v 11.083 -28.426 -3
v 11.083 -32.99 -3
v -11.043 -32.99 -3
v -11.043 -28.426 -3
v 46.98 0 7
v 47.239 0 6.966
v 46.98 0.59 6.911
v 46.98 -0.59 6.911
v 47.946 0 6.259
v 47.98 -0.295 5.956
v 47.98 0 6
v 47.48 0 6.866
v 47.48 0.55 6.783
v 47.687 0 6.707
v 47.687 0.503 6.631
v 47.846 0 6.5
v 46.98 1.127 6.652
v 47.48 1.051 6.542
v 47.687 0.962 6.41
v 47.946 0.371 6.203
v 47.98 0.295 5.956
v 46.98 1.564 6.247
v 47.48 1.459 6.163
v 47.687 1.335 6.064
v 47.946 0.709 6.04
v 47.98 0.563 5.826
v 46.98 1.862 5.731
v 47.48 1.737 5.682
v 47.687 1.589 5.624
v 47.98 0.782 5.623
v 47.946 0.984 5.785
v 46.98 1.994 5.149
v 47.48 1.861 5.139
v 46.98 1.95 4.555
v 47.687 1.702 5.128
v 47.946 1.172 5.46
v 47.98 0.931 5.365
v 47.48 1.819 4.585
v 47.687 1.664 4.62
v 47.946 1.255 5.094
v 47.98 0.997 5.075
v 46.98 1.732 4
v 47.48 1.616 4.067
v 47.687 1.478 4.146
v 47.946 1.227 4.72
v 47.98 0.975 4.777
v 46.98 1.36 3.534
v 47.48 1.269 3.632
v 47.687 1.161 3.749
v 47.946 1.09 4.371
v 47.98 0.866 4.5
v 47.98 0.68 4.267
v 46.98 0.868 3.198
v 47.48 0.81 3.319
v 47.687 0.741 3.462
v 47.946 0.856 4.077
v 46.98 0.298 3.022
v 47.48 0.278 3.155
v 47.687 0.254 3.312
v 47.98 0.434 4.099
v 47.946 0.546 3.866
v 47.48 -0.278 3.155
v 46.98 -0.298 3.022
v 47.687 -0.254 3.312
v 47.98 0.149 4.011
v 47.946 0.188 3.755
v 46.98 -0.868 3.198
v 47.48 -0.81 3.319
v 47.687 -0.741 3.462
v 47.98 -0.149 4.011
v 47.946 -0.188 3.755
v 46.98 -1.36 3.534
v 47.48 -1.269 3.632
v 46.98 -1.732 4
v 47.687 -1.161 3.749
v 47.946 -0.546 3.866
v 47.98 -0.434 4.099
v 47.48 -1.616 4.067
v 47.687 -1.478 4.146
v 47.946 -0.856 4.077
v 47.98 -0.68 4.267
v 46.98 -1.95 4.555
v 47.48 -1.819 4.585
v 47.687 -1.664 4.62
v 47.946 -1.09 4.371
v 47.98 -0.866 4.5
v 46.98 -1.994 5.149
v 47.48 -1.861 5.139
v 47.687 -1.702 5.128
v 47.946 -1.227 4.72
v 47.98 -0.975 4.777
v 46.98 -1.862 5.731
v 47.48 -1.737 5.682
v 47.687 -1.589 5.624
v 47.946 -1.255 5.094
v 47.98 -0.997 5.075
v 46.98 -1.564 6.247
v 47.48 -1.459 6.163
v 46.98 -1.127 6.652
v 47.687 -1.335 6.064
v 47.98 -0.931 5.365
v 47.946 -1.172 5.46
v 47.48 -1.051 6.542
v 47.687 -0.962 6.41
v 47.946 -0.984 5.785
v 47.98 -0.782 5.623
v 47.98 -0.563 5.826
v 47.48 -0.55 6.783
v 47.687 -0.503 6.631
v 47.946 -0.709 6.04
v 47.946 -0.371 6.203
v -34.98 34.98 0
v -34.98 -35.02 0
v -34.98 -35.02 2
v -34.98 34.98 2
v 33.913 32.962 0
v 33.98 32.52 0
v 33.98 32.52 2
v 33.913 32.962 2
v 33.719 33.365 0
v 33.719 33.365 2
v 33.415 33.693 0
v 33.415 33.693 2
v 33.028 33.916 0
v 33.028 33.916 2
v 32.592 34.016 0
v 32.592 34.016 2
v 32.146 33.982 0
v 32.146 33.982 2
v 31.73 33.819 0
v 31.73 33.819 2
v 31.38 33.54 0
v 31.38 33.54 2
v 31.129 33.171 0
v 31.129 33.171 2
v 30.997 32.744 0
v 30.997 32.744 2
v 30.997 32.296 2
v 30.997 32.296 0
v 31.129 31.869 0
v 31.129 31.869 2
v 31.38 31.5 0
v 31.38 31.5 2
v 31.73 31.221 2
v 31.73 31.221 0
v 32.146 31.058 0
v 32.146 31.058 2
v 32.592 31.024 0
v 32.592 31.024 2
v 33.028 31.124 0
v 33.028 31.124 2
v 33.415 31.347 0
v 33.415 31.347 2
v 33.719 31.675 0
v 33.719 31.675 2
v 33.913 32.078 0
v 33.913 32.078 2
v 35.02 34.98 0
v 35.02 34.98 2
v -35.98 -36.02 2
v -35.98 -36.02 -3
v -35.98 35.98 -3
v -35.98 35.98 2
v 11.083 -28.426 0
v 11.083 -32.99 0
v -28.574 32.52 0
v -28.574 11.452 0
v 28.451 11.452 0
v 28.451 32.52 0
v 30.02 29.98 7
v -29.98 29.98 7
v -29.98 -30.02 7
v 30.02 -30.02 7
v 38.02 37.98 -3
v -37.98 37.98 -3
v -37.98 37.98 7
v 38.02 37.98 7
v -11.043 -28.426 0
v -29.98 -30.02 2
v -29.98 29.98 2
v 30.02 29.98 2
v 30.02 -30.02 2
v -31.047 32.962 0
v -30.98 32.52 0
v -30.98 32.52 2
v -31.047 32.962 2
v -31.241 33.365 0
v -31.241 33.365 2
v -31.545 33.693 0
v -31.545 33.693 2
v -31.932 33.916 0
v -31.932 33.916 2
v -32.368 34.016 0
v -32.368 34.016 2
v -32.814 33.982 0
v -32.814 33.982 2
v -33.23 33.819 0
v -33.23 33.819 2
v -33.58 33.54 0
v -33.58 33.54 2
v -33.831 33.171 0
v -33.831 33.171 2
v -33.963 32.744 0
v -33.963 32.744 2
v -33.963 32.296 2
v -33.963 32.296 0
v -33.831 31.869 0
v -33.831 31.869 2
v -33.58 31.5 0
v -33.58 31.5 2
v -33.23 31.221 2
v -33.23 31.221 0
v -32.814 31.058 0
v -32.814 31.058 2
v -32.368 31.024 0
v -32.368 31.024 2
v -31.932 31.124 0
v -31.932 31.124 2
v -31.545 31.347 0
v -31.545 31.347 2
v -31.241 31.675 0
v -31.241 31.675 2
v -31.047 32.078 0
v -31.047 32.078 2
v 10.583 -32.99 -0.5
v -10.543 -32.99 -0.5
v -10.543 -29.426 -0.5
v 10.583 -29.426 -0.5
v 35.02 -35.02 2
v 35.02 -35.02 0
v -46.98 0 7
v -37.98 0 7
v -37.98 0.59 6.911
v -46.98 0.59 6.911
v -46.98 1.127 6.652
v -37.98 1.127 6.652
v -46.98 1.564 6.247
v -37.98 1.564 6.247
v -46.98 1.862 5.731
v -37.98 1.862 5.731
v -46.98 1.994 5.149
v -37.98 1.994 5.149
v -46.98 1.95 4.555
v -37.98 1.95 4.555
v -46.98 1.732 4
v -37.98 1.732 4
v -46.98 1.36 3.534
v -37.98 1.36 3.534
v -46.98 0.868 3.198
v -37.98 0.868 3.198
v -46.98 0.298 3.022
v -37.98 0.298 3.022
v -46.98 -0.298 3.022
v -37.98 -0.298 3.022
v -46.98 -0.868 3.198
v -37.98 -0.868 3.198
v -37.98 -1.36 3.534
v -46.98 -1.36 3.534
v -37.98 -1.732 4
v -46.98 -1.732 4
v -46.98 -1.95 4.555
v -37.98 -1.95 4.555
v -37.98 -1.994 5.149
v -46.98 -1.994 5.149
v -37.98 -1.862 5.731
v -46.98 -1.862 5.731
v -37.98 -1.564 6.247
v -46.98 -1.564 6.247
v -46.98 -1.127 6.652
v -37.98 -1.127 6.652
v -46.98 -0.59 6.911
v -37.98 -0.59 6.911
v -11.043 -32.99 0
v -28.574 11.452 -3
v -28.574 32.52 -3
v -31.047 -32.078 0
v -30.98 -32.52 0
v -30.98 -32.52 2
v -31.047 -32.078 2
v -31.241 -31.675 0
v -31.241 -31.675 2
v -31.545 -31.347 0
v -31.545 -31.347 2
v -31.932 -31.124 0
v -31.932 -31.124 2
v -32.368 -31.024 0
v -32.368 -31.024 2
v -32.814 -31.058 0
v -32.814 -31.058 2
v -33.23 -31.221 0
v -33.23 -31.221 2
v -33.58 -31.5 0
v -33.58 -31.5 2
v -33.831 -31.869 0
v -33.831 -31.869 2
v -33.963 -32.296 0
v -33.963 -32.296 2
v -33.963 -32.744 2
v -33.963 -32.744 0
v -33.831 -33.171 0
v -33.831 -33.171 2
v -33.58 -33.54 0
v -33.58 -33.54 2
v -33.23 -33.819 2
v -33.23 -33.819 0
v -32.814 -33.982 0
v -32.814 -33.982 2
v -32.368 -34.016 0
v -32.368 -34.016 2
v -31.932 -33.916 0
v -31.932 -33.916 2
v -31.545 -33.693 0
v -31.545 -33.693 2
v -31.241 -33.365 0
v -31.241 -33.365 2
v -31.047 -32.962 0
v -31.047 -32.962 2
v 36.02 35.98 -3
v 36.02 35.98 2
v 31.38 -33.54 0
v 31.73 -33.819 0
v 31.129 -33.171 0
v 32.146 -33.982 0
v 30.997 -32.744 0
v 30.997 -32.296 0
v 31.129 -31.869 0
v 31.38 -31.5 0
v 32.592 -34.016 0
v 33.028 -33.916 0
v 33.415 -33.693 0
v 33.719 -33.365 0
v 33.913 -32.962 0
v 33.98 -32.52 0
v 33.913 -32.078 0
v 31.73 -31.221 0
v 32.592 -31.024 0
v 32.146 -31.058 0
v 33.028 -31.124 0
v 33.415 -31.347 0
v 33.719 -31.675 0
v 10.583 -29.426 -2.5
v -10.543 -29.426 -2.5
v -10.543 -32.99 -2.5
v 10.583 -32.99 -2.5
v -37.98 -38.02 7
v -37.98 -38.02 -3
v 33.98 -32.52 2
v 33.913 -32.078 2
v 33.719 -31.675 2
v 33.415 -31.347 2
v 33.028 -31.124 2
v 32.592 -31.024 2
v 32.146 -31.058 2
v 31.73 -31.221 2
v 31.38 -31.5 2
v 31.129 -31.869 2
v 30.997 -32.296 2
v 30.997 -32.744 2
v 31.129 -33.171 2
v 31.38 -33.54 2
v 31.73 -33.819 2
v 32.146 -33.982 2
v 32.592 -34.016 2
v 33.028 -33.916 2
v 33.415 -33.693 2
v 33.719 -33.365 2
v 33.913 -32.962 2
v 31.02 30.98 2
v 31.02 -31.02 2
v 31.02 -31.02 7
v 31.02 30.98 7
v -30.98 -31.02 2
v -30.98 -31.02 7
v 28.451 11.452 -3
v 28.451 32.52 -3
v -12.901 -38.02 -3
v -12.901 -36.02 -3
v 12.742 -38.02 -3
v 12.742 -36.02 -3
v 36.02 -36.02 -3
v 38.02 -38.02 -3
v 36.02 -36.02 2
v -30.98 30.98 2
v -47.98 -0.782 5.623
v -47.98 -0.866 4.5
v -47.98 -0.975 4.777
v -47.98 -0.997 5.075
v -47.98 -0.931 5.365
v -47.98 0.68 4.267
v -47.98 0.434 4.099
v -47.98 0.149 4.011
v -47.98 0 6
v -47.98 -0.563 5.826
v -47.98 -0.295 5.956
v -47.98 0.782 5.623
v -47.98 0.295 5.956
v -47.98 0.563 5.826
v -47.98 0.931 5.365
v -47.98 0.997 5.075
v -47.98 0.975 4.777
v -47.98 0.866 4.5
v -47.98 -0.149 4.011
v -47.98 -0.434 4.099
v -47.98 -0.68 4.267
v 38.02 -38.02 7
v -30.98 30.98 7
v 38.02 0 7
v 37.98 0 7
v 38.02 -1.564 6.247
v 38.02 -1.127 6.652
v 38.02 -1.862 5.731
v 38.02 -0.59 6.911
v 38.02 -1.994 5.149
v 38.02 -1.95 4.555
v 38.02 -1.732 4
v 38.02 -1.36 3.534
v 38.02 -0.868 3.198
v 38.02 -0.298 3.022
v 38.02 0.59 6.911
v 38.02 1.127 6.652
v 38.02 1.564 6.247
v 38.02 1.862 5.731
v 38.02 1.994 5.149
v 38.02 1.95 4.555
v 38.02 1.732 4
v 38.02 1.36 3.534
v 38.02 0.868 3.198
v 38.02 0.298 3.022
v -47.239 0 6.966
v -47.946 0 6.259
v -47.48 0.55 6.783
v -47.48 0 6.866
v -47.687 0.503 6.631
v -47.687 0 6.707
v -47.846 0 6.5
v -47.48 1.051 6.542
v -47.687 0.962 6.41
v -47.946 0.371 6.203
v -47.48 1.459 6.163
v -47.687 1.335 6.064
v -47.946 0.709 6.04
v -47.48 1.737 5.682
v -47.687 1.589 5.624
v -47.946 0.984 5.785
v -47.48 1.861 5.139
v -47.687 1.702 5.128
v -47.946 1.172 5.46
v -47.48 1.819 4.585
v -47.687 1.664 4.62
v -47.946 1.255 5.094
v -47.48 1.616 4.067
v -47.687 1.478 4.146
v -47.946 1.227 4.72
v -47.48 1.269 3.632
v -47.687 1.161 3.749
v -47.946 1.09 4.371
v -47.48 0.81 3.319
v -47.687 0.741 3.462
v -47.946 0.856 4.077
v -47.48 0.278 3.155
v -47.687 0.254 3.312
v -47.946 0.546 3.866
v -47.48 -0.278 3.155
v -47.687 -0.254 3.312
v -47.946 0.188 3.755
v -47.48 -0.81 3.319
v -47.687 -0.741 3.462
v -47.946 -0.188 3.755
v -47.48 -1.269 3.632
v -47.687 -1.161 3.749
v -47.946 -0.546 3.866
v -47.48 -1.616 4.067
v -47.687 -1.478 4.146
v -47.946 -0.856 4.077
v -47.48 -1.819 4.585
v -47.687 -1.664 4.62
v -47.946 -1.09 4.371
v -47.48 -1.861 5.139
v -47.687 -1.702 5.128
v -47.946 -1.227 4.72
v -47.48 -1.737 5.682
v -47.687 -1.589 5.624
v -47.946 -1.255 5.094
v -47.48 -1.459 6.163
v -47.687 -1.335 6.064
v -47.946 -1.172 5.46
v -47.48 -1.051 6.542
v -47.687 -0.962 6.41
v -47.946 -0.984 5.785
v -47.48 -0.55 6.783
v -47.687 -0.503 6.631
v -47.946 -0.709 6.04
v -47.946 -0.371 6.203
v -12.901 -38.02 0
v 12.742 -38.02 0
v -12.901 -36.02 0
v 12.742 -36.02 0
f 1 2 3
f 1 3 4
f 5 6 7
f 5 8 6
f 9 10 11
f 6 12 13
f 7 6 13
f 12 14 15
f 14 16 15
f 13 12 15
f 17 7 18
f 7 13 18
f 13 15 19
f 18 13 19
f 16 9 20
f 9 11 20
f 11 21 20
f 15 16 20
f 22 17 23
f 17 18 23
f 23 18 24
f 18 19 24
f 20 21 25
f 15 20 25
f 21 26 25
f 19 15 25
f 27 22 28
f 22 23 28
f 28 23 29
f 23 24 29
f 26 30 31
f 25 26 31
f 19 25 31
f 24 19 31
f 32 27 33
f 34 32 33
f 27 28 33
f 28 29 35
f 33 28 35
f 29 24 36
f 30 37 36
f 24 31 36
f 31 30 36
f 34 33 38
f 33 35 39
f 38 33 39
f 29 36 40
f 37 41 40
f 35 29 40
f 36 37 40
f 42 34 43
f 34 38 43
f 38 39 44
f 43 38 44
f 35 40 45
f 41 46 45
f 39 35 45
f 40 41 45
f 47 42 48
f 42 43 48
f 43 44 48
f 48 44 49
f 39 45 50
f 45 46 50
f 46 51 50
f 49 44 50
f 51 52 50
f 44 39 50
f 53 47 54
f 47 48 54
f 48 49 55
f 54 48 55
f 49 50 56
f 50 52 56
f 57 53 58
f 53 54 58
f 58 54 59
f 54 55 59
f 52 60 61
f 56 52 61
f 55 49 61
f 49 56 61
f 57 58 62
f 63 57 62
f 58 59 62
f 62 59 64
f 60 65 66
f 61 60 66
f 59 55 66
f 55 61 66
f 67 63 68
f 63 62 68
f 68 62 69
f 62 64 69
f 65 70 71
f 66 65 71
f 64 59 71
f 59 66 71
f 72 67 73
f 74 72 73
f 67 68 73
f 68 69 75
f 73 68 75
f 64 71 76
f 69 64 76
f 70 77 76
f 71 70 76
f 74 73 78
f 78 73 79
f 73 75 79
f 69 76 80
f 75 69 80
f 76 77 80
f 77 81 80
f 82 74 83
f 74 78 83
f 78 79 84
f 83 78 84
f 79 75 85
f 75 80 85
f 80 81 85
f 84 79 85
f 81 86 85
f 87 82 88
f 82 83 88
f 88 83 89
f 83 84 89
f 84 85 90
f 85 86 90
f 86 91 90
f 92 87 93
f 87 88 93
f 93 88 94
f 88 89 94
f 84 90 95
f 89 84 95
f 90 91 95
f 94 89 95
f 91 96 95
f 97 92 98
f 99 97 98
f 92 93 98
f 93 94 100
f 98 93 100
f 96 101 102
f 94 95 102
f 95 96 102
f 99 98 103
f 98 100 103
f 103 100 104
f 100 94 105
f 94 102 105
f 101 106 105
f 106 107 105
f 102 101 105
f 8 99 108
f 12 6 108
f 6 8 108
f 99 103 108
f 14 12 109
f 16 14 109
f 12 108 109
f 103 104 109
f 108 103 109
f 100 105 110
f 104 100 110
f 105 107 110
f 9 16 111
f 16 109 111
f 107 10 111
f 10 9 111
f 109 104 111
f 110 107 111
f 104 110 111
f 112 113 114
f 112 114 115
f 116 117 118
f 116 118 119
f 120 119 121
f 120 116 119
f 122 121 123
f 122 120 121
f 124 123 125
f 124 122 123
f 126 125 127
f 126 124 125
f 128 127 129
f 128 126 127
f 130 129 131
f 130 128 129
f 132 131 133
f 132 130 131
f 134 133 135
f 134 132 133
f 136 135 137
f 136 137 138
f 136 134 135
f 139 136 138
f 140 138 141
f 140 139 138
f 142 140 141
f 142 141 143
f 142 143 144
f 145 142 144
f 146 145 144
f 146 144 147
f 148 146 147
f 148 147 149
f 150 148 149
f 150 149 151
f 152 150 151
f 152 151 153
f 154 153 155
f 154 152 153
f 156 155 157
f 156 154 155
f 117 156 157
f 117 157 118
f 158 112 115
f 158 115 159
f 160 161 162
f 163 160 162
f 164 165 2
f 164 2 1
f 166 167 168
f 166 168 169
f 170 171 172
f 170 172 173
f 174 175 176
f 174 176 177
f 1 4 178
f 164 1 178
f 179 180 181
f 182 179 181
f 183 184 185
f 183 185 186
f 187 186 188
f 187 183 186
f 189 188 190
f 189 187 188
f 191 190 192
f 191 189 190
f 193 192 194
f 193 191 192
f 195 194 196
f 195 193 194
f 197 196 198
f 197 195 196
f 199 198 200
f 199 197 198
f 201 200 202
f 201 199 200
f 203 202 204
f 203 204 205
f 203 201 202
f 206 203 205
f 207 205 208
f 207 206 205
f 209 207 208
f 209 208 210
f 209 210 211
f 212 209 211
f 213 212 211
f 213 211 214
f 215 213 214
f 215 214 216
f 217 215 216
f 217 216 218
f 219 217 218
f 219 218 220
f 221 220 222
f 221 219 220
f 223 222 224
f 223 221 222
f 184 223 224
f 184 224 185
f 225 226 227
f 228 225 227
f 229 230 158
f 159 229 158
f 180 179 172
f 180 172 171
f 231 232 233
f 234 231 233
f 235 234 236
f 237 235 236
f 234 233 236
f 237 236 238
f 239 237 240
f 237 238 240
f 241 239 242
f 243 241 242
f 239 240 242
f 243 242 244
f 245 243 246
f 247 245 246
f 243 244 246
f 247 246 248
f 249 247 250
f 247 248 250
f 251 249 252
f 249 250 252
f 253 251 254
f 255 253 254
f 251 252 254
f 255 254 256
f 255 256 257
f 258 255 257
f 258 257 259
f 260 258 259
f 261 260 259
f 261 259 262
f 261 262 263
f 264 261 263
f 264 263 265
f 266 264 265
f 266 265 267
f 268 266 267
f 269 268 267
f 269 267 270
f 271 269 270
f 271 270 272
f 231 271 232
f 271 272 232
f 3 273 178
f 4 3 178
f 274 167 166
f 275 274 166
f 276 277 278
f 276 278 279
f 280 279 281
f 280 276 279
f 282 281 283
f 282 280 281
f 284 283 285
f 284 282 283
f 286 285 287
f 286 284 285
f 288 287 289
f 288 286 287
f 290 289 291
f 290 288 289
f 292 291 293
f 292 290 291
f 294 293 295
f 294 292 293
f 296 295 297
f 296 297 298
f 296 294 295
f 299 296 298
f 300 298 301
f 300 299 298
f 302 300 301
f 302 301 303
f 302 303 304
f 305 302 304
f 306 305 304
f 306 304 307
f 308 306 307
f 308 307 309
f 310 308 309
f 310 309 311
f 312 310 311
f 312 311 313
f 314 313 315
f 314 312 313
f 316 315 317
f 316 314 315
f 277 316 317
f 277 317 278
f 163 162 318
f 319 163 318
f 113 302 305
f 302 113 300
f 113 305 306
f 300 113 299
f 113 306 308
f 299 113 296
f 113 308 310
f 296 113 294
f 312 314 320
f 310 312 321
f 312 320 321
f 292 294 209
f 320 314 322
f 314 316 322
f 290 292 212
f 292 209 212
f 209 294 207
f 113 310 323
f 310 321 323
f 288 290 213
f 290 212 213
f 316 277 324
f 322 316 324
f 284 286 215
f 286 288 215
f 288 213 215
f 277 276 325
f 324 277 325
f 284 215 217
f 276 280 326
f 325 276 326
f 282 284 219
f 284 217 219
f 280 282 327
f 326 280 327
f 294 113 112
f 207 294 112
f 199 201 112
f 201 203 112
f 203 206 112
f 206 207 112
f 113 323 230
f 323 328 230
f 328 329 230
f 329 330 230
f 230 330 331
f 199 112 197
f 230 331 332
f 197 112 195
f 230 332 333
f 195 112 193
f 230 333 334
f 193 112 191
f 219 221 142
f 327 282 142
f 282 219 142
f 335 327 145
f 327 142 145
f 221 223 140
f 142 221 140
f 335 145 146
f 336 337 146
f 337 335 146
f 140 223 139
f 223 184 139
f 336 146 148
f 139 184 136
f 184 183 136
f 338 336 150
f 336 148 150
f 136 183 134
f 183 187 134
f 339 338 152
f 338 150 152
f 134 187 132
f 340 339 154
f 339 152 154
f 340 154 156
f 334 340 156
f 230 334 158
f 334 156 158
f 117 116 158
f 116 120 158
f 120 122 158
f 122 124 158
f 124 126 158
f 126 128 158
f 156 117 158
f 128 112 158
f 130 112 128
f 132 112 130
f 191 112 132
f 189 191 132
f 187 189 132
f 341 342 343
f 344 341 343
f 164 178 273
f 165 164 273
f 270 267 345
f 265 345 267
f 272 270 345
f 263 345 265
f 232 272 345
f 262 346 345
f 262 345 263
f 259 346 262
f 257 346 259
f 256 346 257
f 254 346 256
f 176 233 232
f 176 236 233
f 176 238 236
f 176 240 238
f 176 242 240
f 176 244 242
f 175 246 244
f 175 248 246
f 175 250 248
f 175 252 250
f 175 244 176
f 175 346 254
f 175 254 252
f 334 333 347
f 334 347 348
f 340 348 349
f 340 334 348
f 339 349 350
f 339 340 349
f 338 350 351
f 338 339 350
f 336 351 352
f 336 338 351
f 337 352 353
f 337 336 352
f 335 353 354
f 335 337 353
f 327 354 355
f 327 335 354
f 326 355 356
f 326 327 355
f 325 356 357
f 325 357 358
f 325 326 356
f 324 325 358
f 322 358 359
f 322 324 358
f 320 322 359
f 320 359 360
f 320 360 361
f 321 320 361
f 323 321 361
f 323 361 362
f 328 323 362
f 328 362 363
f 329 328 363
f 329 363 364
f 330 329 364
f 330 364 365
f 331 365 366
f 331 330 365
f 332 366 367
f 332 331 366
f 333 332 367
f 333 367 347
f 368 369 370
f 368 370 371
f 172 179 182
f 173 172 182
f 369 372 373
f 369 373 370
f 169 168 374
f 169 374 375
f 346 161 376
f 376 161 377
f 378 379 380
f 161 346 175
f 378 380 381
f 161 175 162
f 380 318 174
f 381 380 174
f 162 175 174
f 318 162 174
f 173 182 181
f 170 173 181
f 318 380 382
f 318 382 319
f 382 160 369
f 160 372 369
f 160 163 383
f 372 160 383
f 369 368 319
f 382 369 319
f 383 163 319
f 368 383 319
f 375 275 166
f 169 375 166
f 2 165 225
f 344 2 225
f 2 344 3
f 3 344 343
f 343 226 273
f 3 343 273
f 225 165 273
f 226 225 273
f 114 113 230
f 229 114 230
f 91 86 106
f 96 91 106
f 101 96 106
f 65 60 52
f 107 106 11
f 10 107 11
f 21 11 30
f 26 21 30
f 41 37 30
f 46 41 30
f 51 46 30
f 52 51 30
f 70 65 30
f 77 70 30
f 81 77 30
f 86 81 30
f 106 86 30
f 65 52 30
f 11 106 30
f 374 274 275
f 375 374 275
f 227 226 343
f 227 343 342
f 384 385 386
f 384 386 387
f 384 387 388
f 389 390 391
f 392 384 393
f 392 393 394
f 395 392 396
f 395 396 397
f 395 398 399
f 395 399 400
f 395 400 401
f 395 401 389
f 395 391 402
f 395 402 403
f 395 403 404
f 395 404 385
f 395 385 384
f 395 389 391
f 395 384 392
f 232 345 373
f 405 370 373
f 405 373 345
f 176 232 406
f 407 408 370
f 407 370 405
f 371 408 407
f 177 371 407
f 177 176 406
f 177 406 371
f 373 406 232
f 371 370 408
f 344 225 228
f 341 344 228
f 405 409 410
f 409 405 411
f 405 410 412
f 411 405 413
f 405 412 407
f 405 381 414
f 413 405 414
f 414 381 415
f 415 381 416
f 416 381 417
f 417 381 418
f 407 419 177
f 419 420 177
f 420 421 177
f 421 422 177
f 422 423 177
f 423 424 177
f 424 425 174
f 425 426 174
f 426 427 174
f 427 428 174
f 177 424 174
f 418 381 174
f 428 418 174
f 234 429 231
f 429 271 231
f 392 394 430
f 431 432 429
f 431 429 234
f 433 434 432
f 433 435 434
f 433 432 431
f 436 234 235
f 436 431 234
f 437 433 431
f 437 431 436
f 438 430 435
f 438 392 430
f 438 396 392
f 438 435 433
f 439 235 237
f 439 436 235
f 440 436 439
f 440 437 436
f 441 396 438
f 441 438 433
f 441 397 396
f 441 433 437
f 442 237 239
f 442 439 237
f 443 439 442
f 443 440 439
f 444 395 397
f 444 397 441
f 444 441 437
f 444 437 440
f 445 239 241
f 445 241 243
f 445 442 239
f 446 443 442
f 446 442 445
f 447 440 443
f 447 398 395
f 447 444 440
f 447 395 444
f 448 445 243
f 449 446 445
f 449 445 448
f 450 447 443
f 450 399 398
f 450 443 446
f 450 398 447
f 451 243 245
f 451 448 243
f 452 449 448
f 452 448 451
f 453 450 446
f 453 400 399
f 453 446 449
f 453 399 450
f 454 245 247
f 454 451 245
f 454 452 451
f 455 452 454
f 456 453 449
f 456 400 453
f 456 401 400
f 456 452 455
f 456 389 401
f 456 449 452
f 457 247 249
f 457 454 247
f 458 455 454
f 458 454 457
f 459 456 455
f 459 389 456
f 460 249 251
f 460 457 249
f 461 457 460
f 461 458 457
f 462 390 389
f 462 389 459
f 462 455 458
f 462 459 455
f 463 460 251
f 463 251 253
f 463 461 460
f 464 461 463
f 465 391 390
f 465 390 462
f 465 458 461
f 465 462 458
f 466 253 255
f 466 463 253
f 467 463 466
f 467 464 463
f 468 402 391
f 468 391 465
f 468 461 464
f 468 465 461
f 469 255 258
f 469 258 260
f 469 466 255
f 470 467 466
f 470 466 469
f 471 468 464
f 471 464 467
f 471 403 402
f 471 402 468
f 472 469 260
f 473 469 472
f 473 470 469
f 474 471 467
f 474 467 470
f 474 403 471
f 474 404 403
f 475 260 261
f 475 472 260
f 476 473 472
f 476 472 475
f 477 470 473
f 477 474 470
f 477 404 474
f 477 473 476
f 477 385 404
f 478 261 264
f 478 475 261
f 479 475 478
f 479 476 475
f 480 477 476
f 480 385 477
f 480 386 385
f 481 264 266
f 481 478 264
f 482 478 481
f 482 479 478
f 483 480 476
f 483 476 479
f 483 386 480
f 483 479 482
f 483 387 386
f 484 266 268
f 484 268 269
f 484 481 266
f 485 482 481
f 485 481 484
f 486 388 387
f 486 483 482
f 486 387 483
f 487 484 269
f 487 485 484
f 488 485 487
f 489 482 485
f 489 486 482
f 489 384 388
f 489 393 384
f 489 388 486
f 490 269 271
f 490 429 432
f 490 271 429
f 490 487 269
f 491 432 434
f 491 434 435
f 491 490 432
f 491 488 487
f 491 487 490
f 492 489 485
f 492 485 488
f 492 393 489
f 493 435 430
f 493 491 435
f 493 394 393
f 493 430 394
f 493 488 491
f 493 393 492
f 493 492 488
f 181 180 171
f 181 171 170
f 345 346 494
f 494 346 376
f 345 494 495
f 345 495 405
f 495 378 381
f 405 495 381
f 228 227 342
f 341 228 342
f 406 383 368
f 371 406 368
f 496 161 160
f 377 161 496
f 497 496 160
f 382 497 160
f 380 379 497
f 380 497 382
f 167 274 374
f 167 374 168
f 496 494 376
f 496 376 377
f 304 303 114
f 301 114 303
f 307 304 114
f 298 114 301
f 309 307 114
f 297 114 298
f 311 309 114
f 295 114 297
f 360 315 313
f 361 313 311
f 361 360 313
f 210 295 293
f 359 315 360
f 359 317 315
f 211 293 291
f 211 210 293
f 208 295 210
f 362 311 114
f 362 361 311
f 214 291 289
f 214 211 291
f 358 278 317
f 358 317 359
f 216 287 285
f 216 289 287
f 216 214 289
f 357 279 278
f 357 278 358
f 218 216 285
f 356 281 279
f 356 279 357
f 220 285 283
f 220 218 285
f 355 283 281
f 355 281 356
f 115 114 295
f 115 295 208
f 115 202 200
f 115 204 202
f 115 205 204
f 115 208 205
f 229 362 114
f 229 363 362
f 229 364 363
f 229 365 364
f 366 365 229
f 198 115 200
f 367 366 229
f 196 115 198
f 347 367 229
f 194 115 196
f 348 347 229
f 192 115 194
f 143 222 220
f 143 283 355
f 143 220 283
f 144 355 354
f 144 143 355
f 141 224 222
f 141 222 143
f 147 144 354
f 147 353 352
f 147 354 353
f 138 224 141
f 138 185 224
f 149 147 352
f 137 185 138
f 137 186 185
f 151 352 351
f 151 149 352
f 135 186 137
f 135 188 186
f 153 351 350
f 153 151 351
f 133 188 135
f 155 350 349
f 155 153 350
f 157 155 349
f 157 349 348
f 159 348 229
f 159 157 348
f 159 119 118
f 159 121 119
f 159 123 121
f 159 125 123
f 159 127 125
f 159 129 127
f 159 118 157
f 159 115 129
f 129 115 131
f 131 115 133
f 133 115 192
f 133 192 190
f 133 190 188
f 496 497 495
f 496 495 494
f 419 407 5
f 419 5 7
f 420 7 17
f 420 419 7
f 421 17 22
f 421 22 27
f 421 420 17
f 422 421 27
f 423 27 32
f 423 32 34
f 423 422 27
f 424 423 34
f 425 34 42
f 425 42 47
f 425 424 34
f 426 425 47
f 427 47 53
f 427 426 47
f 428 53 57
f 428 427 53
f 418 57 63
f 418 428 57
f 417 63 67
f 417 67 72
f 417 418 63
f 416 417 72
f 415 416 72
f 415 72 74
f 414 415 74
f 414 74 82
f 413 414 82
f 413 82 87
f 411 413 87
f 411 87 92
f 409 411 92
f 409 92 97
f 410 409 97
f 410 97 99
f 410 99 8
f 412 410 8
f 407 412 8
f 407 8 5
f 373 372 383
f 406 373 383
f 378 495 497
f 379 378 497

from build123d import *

# Parameters (mm, degrees)
RFID_READER_OUTLINE_W    = 70
RFID_READER_OUTLINE_H    = 70
RFID_READER_OUTLINE_R    = 1.5
RFID_READER_DEPTH        = 2
RFID_READER_START        = -28.574472263
RFID_READER_2_OUTLINE_W  = 21.067677481
RFID_READER_2_OUTLINE_H  = 3
RFID_READER_2_DEPTH      = 57.02588195
RFID_READER_START_2      = 2
RFID_READER_3_OUTLINE_W  = 60
RFID_READER_3_OUTLINE_H  = 60
RFID_READER_3_DEPTH      = 5
RFID_READER_START_3      = -11.042809432
RFID_READER_4_DEPTH      = 22.125679749
RFID_READER_5_OUTLINE_W  = 5.593739236
RFID_READER_5_OUTLINE_H  = 2
RFID_READER_5_DEPTH      = 0.5
RFID_READER_START_4      = 10.582870317
RFID_READER_6_OUTLINE_W  = 5.593739236
RFID_READER_6_OUTLINE_H  = 2
RFID_READER_6_DEPTH      = 0.5
SKETCH2_W                = 72
SKETCH2_H                = 72
SKETCH2_W_2              = 62
SKETCH2_H_2              = 62
BOSS_EXTRUDE5_DEPTH      = 5
BOSS_EXTRUDE7_START      = -5
SKETCH2_8_W              = 76
SKETCH2_8_H              = 76
SKETCH2_8_W_2            = 72
SKETCH2_8_H_2            = 72
BOSS_EXTRUDE7_DEPTH      = 10
SKETCH4_R                = 2
BOSS_EXTRUDE12_DEPTH     = 10
FILLET1_R                = 1
FILLET1_OF_MIRROR1_R     = 1
CUT_EXTRUDE1_START       = -3
CUT_EXTRUDE1_OUTLINE_W   = 25.642995067
CUT_EXTRUDE1_OUTLINE_H   = 2
CUT_EXTRUDE1_OUTLINE_W_2 = 22.125679749
CUT_EXTRUDE1_OUTLINE_H_2 = 2.030434915
CUT_EXTRUDE1_DEPTH       = 3


# Read off the part's stored shape, not the designer's step: RFID_reader, Cut-Extrude1
with BuildPart() as part:
    # RFID_reader outline → RFID_reader (new body)
    with BuildSketch(Plane.XY):
        with Locations((0.020030443, -0.020030443)):
            Rectangle(RFID_READER_OUTLINE_W, RFID_READER_OUTLINE_H)
        with Locations((-32.479969557, -32.520030443)):
            Circle(RFID_READER_OUTLINE_R, mode=Mode.SUBTRACT)
        with Locations((32.479969557, -32.520030443)):
            Circle(RFID_READER_OUTLINE_R, mode=Mode.SUBTRACT)
        with Locations((-32.479969557, 32.520030443)):
            Circle(RFID_READER_OUTLINE_R, mode=Mode.SUBTRACT)
        with Locations((32.479969557, 32.520030443)):
            Circle(RFID_READER_OUTLINE_R, mode=Mode.SUBTRACT)
    extrude(amount=RFID_READER_DEPTH)


with BuildPart() as body_2:
    # RFID_reader 2 outline → RFID_reader 2 (new body)
    with BuildSketch(Plane.YZ.offset(RFID_READER_START)):
        with Locations((21.986191703, -1.5)):
            Rectangle(RFID_READER_2_OUTLINE_W, RFID_READER_2_OUTLINE_H)
    extrude(amount=RFID_READER_2_DEPTH)


with BuildPart() as body_3:
    # RFID_reader 3 outline → RFID_reader 3 (new body)
    with BuildSketch(Plane.XY.offset(RFID_READER_START_2)):
        with Locations((0.020030443, -0.020030443)):
            Rectangle(RFID_READER_3_OUTLINE_W, RFID_READER_3_OUTLINE_H)
    extrude(amount=RFID_READER_3_DEPTH)


with BuildPart() as body_4:
    # RFID_reader 4 outline → RFID_reader 4 (new body)
    with BuildSketch(Plane.YZ.offset(RFID_READER_START_3)):
        Polygon((-35.020030443, -3), (-28.426291207, -3), (-28.426291207, 0), (-35.020030443, 0), (-35.020030443, -0.5), (-29.426291207, -0.5), (-29.426291207, -2.5), (-35.020030443, -2.5), align=None)
    extrude(amount=RFID_READER_4_DEPTH)

    # RFID_reader 5 outline → RFID_reader 5 (add)
    with BuildSketch(Plane.YZ.offset(RFID_READER_START_3)):
        with Locations((-32.223160825, -1.5)):
            Rectangle(RFID_READER_5_OUTLINE_W, RFID_READER_5_OUTLINE_H)
    extrude(amount=RFID_READER_5_DEPTH)

    # RFID_reader 6 outline → RFID_reader 6 (add)
    with BuildSketch(Plane.YZ.offset(RFID_READER_START_4)):
        with Locations((-32.223160825, -1.5)):
            Rectangle(RFID_READER_6_OUTLINE_W, RFID_READER_6_OUTLINE_H)
    extrude(amount=RFID_READER_6_DEPTH)


with BuildPart() as body_5:
    # Sketch2 → Boss-Extrude5 (new body)
    with BuildSketch(Plane.XY.offset(2)):
        with Locations((0.020030443, -0.020030443)):
            Rectangle(SKETCH2_W, SKETCH2_H)
        with Locations((0.020030443, -0.020030443)):
            Rectangle(SKETCH2_W_2, SKETCH2_H_2, mode=Mode.SUBTRACT)
    extrude(amount=BOSS_EXTRUDE5_DEPTH)

    # Sketch2<8> → Boss-Extrude7 (add)
    with BuildSketch(Plane.XY.offset(2).offset(BOSS_EXTRUDE7_START)):
        with Locations((0.020030443, -0.020030443)):
            Rectangle(SKETCH2_8_W, SKETCH2_8_H)
        with Locations((0.020030443, -0.020030443)):
            Rectangle(SKETCH2_8_W_2, SKETCH2_8_H_2, mode=Mode.SUBTRACT)
    extrude(amount=BOSS_EXTRUDE7_DEPTH)

    # Sketch4 → Boss-Extrude12 (add)
    with BuildSketch(Plane.ZY.offset(37.979969557)):
        with Locations((5, 0)):
            Circle(SKETCH4_R)
    boss_extrude12 = extrude(amount=BOSS_EXTRUDE12_DEPTH)

    # Fillet1
    fillet1_edges = [body_5.edges().sort_by_distance(p)[0] for p in [
        (-47.979969557, 0, 3),
    ]]
    fillet(fillet1_edges, radius=FILLET1_R)

    # Mirror1: Boss-Extrude12 across plane
    add(boss_extrude12.mirror(Plane(origin=(0, 0, 0), x_dir=(0, 0, 1), z_dir=(1, 0, 0))))

    # Fillet1 of Mirror1
    fillet1_of_mirror1_edges = [body_5.edges().sort_by_distance(p)[0] for p in [
        (47.979969557, 0, 3),
    ]]
    fillet(fillet1_of_mirror1_edges, radius=FILLET1_OF_MIRROR1_R)


with BuildPart() as cut_extrude1_tool:
    # Cut-Extrude1 outline → Cut-Extrude1 (new body)
    with BuildSketch(Plane(origin=(0, 0, -3), x_dir=(-1, 0, 0), z_dir=(0, 0, -1)).offset(CUT_EXTRUDE1_START)):
        with Locations((0.07963663, -37.020030443)):
            Rectangle(CUT_EXTRUDE1_OUTLINE_W, CUT_EXTRUDE1_OUTLINE_H)
        with Locations((-0.020030443, -34.004812986)):
            Rectangle(CUT_EXTRUDE1_OUTLINE_W_2, CUT_EXTRUDE1_OUTLINE_H_2)
    extrude(amount=CUT_EXTRUDE1_DEPTH)


with BuildPart() as body_4_1:
    add(body_4.part)

    # Cut-Extrude1: cut by cut_extrude1_tool
    add(cut_extrude1_tool.part, mode=Mode.SUBTRACT)


with BuildPart() as body_5_1:
    add(body_5.part)

    # Cut-Extrude1: cut by cut_extrude1_tool
    add(cut_extrude1_tool.part, mode=Mode.SUBTRACT)


solid = Compound([part.part, body_2.part, body_3.part, body_4_1.part, body_5_1.part])
